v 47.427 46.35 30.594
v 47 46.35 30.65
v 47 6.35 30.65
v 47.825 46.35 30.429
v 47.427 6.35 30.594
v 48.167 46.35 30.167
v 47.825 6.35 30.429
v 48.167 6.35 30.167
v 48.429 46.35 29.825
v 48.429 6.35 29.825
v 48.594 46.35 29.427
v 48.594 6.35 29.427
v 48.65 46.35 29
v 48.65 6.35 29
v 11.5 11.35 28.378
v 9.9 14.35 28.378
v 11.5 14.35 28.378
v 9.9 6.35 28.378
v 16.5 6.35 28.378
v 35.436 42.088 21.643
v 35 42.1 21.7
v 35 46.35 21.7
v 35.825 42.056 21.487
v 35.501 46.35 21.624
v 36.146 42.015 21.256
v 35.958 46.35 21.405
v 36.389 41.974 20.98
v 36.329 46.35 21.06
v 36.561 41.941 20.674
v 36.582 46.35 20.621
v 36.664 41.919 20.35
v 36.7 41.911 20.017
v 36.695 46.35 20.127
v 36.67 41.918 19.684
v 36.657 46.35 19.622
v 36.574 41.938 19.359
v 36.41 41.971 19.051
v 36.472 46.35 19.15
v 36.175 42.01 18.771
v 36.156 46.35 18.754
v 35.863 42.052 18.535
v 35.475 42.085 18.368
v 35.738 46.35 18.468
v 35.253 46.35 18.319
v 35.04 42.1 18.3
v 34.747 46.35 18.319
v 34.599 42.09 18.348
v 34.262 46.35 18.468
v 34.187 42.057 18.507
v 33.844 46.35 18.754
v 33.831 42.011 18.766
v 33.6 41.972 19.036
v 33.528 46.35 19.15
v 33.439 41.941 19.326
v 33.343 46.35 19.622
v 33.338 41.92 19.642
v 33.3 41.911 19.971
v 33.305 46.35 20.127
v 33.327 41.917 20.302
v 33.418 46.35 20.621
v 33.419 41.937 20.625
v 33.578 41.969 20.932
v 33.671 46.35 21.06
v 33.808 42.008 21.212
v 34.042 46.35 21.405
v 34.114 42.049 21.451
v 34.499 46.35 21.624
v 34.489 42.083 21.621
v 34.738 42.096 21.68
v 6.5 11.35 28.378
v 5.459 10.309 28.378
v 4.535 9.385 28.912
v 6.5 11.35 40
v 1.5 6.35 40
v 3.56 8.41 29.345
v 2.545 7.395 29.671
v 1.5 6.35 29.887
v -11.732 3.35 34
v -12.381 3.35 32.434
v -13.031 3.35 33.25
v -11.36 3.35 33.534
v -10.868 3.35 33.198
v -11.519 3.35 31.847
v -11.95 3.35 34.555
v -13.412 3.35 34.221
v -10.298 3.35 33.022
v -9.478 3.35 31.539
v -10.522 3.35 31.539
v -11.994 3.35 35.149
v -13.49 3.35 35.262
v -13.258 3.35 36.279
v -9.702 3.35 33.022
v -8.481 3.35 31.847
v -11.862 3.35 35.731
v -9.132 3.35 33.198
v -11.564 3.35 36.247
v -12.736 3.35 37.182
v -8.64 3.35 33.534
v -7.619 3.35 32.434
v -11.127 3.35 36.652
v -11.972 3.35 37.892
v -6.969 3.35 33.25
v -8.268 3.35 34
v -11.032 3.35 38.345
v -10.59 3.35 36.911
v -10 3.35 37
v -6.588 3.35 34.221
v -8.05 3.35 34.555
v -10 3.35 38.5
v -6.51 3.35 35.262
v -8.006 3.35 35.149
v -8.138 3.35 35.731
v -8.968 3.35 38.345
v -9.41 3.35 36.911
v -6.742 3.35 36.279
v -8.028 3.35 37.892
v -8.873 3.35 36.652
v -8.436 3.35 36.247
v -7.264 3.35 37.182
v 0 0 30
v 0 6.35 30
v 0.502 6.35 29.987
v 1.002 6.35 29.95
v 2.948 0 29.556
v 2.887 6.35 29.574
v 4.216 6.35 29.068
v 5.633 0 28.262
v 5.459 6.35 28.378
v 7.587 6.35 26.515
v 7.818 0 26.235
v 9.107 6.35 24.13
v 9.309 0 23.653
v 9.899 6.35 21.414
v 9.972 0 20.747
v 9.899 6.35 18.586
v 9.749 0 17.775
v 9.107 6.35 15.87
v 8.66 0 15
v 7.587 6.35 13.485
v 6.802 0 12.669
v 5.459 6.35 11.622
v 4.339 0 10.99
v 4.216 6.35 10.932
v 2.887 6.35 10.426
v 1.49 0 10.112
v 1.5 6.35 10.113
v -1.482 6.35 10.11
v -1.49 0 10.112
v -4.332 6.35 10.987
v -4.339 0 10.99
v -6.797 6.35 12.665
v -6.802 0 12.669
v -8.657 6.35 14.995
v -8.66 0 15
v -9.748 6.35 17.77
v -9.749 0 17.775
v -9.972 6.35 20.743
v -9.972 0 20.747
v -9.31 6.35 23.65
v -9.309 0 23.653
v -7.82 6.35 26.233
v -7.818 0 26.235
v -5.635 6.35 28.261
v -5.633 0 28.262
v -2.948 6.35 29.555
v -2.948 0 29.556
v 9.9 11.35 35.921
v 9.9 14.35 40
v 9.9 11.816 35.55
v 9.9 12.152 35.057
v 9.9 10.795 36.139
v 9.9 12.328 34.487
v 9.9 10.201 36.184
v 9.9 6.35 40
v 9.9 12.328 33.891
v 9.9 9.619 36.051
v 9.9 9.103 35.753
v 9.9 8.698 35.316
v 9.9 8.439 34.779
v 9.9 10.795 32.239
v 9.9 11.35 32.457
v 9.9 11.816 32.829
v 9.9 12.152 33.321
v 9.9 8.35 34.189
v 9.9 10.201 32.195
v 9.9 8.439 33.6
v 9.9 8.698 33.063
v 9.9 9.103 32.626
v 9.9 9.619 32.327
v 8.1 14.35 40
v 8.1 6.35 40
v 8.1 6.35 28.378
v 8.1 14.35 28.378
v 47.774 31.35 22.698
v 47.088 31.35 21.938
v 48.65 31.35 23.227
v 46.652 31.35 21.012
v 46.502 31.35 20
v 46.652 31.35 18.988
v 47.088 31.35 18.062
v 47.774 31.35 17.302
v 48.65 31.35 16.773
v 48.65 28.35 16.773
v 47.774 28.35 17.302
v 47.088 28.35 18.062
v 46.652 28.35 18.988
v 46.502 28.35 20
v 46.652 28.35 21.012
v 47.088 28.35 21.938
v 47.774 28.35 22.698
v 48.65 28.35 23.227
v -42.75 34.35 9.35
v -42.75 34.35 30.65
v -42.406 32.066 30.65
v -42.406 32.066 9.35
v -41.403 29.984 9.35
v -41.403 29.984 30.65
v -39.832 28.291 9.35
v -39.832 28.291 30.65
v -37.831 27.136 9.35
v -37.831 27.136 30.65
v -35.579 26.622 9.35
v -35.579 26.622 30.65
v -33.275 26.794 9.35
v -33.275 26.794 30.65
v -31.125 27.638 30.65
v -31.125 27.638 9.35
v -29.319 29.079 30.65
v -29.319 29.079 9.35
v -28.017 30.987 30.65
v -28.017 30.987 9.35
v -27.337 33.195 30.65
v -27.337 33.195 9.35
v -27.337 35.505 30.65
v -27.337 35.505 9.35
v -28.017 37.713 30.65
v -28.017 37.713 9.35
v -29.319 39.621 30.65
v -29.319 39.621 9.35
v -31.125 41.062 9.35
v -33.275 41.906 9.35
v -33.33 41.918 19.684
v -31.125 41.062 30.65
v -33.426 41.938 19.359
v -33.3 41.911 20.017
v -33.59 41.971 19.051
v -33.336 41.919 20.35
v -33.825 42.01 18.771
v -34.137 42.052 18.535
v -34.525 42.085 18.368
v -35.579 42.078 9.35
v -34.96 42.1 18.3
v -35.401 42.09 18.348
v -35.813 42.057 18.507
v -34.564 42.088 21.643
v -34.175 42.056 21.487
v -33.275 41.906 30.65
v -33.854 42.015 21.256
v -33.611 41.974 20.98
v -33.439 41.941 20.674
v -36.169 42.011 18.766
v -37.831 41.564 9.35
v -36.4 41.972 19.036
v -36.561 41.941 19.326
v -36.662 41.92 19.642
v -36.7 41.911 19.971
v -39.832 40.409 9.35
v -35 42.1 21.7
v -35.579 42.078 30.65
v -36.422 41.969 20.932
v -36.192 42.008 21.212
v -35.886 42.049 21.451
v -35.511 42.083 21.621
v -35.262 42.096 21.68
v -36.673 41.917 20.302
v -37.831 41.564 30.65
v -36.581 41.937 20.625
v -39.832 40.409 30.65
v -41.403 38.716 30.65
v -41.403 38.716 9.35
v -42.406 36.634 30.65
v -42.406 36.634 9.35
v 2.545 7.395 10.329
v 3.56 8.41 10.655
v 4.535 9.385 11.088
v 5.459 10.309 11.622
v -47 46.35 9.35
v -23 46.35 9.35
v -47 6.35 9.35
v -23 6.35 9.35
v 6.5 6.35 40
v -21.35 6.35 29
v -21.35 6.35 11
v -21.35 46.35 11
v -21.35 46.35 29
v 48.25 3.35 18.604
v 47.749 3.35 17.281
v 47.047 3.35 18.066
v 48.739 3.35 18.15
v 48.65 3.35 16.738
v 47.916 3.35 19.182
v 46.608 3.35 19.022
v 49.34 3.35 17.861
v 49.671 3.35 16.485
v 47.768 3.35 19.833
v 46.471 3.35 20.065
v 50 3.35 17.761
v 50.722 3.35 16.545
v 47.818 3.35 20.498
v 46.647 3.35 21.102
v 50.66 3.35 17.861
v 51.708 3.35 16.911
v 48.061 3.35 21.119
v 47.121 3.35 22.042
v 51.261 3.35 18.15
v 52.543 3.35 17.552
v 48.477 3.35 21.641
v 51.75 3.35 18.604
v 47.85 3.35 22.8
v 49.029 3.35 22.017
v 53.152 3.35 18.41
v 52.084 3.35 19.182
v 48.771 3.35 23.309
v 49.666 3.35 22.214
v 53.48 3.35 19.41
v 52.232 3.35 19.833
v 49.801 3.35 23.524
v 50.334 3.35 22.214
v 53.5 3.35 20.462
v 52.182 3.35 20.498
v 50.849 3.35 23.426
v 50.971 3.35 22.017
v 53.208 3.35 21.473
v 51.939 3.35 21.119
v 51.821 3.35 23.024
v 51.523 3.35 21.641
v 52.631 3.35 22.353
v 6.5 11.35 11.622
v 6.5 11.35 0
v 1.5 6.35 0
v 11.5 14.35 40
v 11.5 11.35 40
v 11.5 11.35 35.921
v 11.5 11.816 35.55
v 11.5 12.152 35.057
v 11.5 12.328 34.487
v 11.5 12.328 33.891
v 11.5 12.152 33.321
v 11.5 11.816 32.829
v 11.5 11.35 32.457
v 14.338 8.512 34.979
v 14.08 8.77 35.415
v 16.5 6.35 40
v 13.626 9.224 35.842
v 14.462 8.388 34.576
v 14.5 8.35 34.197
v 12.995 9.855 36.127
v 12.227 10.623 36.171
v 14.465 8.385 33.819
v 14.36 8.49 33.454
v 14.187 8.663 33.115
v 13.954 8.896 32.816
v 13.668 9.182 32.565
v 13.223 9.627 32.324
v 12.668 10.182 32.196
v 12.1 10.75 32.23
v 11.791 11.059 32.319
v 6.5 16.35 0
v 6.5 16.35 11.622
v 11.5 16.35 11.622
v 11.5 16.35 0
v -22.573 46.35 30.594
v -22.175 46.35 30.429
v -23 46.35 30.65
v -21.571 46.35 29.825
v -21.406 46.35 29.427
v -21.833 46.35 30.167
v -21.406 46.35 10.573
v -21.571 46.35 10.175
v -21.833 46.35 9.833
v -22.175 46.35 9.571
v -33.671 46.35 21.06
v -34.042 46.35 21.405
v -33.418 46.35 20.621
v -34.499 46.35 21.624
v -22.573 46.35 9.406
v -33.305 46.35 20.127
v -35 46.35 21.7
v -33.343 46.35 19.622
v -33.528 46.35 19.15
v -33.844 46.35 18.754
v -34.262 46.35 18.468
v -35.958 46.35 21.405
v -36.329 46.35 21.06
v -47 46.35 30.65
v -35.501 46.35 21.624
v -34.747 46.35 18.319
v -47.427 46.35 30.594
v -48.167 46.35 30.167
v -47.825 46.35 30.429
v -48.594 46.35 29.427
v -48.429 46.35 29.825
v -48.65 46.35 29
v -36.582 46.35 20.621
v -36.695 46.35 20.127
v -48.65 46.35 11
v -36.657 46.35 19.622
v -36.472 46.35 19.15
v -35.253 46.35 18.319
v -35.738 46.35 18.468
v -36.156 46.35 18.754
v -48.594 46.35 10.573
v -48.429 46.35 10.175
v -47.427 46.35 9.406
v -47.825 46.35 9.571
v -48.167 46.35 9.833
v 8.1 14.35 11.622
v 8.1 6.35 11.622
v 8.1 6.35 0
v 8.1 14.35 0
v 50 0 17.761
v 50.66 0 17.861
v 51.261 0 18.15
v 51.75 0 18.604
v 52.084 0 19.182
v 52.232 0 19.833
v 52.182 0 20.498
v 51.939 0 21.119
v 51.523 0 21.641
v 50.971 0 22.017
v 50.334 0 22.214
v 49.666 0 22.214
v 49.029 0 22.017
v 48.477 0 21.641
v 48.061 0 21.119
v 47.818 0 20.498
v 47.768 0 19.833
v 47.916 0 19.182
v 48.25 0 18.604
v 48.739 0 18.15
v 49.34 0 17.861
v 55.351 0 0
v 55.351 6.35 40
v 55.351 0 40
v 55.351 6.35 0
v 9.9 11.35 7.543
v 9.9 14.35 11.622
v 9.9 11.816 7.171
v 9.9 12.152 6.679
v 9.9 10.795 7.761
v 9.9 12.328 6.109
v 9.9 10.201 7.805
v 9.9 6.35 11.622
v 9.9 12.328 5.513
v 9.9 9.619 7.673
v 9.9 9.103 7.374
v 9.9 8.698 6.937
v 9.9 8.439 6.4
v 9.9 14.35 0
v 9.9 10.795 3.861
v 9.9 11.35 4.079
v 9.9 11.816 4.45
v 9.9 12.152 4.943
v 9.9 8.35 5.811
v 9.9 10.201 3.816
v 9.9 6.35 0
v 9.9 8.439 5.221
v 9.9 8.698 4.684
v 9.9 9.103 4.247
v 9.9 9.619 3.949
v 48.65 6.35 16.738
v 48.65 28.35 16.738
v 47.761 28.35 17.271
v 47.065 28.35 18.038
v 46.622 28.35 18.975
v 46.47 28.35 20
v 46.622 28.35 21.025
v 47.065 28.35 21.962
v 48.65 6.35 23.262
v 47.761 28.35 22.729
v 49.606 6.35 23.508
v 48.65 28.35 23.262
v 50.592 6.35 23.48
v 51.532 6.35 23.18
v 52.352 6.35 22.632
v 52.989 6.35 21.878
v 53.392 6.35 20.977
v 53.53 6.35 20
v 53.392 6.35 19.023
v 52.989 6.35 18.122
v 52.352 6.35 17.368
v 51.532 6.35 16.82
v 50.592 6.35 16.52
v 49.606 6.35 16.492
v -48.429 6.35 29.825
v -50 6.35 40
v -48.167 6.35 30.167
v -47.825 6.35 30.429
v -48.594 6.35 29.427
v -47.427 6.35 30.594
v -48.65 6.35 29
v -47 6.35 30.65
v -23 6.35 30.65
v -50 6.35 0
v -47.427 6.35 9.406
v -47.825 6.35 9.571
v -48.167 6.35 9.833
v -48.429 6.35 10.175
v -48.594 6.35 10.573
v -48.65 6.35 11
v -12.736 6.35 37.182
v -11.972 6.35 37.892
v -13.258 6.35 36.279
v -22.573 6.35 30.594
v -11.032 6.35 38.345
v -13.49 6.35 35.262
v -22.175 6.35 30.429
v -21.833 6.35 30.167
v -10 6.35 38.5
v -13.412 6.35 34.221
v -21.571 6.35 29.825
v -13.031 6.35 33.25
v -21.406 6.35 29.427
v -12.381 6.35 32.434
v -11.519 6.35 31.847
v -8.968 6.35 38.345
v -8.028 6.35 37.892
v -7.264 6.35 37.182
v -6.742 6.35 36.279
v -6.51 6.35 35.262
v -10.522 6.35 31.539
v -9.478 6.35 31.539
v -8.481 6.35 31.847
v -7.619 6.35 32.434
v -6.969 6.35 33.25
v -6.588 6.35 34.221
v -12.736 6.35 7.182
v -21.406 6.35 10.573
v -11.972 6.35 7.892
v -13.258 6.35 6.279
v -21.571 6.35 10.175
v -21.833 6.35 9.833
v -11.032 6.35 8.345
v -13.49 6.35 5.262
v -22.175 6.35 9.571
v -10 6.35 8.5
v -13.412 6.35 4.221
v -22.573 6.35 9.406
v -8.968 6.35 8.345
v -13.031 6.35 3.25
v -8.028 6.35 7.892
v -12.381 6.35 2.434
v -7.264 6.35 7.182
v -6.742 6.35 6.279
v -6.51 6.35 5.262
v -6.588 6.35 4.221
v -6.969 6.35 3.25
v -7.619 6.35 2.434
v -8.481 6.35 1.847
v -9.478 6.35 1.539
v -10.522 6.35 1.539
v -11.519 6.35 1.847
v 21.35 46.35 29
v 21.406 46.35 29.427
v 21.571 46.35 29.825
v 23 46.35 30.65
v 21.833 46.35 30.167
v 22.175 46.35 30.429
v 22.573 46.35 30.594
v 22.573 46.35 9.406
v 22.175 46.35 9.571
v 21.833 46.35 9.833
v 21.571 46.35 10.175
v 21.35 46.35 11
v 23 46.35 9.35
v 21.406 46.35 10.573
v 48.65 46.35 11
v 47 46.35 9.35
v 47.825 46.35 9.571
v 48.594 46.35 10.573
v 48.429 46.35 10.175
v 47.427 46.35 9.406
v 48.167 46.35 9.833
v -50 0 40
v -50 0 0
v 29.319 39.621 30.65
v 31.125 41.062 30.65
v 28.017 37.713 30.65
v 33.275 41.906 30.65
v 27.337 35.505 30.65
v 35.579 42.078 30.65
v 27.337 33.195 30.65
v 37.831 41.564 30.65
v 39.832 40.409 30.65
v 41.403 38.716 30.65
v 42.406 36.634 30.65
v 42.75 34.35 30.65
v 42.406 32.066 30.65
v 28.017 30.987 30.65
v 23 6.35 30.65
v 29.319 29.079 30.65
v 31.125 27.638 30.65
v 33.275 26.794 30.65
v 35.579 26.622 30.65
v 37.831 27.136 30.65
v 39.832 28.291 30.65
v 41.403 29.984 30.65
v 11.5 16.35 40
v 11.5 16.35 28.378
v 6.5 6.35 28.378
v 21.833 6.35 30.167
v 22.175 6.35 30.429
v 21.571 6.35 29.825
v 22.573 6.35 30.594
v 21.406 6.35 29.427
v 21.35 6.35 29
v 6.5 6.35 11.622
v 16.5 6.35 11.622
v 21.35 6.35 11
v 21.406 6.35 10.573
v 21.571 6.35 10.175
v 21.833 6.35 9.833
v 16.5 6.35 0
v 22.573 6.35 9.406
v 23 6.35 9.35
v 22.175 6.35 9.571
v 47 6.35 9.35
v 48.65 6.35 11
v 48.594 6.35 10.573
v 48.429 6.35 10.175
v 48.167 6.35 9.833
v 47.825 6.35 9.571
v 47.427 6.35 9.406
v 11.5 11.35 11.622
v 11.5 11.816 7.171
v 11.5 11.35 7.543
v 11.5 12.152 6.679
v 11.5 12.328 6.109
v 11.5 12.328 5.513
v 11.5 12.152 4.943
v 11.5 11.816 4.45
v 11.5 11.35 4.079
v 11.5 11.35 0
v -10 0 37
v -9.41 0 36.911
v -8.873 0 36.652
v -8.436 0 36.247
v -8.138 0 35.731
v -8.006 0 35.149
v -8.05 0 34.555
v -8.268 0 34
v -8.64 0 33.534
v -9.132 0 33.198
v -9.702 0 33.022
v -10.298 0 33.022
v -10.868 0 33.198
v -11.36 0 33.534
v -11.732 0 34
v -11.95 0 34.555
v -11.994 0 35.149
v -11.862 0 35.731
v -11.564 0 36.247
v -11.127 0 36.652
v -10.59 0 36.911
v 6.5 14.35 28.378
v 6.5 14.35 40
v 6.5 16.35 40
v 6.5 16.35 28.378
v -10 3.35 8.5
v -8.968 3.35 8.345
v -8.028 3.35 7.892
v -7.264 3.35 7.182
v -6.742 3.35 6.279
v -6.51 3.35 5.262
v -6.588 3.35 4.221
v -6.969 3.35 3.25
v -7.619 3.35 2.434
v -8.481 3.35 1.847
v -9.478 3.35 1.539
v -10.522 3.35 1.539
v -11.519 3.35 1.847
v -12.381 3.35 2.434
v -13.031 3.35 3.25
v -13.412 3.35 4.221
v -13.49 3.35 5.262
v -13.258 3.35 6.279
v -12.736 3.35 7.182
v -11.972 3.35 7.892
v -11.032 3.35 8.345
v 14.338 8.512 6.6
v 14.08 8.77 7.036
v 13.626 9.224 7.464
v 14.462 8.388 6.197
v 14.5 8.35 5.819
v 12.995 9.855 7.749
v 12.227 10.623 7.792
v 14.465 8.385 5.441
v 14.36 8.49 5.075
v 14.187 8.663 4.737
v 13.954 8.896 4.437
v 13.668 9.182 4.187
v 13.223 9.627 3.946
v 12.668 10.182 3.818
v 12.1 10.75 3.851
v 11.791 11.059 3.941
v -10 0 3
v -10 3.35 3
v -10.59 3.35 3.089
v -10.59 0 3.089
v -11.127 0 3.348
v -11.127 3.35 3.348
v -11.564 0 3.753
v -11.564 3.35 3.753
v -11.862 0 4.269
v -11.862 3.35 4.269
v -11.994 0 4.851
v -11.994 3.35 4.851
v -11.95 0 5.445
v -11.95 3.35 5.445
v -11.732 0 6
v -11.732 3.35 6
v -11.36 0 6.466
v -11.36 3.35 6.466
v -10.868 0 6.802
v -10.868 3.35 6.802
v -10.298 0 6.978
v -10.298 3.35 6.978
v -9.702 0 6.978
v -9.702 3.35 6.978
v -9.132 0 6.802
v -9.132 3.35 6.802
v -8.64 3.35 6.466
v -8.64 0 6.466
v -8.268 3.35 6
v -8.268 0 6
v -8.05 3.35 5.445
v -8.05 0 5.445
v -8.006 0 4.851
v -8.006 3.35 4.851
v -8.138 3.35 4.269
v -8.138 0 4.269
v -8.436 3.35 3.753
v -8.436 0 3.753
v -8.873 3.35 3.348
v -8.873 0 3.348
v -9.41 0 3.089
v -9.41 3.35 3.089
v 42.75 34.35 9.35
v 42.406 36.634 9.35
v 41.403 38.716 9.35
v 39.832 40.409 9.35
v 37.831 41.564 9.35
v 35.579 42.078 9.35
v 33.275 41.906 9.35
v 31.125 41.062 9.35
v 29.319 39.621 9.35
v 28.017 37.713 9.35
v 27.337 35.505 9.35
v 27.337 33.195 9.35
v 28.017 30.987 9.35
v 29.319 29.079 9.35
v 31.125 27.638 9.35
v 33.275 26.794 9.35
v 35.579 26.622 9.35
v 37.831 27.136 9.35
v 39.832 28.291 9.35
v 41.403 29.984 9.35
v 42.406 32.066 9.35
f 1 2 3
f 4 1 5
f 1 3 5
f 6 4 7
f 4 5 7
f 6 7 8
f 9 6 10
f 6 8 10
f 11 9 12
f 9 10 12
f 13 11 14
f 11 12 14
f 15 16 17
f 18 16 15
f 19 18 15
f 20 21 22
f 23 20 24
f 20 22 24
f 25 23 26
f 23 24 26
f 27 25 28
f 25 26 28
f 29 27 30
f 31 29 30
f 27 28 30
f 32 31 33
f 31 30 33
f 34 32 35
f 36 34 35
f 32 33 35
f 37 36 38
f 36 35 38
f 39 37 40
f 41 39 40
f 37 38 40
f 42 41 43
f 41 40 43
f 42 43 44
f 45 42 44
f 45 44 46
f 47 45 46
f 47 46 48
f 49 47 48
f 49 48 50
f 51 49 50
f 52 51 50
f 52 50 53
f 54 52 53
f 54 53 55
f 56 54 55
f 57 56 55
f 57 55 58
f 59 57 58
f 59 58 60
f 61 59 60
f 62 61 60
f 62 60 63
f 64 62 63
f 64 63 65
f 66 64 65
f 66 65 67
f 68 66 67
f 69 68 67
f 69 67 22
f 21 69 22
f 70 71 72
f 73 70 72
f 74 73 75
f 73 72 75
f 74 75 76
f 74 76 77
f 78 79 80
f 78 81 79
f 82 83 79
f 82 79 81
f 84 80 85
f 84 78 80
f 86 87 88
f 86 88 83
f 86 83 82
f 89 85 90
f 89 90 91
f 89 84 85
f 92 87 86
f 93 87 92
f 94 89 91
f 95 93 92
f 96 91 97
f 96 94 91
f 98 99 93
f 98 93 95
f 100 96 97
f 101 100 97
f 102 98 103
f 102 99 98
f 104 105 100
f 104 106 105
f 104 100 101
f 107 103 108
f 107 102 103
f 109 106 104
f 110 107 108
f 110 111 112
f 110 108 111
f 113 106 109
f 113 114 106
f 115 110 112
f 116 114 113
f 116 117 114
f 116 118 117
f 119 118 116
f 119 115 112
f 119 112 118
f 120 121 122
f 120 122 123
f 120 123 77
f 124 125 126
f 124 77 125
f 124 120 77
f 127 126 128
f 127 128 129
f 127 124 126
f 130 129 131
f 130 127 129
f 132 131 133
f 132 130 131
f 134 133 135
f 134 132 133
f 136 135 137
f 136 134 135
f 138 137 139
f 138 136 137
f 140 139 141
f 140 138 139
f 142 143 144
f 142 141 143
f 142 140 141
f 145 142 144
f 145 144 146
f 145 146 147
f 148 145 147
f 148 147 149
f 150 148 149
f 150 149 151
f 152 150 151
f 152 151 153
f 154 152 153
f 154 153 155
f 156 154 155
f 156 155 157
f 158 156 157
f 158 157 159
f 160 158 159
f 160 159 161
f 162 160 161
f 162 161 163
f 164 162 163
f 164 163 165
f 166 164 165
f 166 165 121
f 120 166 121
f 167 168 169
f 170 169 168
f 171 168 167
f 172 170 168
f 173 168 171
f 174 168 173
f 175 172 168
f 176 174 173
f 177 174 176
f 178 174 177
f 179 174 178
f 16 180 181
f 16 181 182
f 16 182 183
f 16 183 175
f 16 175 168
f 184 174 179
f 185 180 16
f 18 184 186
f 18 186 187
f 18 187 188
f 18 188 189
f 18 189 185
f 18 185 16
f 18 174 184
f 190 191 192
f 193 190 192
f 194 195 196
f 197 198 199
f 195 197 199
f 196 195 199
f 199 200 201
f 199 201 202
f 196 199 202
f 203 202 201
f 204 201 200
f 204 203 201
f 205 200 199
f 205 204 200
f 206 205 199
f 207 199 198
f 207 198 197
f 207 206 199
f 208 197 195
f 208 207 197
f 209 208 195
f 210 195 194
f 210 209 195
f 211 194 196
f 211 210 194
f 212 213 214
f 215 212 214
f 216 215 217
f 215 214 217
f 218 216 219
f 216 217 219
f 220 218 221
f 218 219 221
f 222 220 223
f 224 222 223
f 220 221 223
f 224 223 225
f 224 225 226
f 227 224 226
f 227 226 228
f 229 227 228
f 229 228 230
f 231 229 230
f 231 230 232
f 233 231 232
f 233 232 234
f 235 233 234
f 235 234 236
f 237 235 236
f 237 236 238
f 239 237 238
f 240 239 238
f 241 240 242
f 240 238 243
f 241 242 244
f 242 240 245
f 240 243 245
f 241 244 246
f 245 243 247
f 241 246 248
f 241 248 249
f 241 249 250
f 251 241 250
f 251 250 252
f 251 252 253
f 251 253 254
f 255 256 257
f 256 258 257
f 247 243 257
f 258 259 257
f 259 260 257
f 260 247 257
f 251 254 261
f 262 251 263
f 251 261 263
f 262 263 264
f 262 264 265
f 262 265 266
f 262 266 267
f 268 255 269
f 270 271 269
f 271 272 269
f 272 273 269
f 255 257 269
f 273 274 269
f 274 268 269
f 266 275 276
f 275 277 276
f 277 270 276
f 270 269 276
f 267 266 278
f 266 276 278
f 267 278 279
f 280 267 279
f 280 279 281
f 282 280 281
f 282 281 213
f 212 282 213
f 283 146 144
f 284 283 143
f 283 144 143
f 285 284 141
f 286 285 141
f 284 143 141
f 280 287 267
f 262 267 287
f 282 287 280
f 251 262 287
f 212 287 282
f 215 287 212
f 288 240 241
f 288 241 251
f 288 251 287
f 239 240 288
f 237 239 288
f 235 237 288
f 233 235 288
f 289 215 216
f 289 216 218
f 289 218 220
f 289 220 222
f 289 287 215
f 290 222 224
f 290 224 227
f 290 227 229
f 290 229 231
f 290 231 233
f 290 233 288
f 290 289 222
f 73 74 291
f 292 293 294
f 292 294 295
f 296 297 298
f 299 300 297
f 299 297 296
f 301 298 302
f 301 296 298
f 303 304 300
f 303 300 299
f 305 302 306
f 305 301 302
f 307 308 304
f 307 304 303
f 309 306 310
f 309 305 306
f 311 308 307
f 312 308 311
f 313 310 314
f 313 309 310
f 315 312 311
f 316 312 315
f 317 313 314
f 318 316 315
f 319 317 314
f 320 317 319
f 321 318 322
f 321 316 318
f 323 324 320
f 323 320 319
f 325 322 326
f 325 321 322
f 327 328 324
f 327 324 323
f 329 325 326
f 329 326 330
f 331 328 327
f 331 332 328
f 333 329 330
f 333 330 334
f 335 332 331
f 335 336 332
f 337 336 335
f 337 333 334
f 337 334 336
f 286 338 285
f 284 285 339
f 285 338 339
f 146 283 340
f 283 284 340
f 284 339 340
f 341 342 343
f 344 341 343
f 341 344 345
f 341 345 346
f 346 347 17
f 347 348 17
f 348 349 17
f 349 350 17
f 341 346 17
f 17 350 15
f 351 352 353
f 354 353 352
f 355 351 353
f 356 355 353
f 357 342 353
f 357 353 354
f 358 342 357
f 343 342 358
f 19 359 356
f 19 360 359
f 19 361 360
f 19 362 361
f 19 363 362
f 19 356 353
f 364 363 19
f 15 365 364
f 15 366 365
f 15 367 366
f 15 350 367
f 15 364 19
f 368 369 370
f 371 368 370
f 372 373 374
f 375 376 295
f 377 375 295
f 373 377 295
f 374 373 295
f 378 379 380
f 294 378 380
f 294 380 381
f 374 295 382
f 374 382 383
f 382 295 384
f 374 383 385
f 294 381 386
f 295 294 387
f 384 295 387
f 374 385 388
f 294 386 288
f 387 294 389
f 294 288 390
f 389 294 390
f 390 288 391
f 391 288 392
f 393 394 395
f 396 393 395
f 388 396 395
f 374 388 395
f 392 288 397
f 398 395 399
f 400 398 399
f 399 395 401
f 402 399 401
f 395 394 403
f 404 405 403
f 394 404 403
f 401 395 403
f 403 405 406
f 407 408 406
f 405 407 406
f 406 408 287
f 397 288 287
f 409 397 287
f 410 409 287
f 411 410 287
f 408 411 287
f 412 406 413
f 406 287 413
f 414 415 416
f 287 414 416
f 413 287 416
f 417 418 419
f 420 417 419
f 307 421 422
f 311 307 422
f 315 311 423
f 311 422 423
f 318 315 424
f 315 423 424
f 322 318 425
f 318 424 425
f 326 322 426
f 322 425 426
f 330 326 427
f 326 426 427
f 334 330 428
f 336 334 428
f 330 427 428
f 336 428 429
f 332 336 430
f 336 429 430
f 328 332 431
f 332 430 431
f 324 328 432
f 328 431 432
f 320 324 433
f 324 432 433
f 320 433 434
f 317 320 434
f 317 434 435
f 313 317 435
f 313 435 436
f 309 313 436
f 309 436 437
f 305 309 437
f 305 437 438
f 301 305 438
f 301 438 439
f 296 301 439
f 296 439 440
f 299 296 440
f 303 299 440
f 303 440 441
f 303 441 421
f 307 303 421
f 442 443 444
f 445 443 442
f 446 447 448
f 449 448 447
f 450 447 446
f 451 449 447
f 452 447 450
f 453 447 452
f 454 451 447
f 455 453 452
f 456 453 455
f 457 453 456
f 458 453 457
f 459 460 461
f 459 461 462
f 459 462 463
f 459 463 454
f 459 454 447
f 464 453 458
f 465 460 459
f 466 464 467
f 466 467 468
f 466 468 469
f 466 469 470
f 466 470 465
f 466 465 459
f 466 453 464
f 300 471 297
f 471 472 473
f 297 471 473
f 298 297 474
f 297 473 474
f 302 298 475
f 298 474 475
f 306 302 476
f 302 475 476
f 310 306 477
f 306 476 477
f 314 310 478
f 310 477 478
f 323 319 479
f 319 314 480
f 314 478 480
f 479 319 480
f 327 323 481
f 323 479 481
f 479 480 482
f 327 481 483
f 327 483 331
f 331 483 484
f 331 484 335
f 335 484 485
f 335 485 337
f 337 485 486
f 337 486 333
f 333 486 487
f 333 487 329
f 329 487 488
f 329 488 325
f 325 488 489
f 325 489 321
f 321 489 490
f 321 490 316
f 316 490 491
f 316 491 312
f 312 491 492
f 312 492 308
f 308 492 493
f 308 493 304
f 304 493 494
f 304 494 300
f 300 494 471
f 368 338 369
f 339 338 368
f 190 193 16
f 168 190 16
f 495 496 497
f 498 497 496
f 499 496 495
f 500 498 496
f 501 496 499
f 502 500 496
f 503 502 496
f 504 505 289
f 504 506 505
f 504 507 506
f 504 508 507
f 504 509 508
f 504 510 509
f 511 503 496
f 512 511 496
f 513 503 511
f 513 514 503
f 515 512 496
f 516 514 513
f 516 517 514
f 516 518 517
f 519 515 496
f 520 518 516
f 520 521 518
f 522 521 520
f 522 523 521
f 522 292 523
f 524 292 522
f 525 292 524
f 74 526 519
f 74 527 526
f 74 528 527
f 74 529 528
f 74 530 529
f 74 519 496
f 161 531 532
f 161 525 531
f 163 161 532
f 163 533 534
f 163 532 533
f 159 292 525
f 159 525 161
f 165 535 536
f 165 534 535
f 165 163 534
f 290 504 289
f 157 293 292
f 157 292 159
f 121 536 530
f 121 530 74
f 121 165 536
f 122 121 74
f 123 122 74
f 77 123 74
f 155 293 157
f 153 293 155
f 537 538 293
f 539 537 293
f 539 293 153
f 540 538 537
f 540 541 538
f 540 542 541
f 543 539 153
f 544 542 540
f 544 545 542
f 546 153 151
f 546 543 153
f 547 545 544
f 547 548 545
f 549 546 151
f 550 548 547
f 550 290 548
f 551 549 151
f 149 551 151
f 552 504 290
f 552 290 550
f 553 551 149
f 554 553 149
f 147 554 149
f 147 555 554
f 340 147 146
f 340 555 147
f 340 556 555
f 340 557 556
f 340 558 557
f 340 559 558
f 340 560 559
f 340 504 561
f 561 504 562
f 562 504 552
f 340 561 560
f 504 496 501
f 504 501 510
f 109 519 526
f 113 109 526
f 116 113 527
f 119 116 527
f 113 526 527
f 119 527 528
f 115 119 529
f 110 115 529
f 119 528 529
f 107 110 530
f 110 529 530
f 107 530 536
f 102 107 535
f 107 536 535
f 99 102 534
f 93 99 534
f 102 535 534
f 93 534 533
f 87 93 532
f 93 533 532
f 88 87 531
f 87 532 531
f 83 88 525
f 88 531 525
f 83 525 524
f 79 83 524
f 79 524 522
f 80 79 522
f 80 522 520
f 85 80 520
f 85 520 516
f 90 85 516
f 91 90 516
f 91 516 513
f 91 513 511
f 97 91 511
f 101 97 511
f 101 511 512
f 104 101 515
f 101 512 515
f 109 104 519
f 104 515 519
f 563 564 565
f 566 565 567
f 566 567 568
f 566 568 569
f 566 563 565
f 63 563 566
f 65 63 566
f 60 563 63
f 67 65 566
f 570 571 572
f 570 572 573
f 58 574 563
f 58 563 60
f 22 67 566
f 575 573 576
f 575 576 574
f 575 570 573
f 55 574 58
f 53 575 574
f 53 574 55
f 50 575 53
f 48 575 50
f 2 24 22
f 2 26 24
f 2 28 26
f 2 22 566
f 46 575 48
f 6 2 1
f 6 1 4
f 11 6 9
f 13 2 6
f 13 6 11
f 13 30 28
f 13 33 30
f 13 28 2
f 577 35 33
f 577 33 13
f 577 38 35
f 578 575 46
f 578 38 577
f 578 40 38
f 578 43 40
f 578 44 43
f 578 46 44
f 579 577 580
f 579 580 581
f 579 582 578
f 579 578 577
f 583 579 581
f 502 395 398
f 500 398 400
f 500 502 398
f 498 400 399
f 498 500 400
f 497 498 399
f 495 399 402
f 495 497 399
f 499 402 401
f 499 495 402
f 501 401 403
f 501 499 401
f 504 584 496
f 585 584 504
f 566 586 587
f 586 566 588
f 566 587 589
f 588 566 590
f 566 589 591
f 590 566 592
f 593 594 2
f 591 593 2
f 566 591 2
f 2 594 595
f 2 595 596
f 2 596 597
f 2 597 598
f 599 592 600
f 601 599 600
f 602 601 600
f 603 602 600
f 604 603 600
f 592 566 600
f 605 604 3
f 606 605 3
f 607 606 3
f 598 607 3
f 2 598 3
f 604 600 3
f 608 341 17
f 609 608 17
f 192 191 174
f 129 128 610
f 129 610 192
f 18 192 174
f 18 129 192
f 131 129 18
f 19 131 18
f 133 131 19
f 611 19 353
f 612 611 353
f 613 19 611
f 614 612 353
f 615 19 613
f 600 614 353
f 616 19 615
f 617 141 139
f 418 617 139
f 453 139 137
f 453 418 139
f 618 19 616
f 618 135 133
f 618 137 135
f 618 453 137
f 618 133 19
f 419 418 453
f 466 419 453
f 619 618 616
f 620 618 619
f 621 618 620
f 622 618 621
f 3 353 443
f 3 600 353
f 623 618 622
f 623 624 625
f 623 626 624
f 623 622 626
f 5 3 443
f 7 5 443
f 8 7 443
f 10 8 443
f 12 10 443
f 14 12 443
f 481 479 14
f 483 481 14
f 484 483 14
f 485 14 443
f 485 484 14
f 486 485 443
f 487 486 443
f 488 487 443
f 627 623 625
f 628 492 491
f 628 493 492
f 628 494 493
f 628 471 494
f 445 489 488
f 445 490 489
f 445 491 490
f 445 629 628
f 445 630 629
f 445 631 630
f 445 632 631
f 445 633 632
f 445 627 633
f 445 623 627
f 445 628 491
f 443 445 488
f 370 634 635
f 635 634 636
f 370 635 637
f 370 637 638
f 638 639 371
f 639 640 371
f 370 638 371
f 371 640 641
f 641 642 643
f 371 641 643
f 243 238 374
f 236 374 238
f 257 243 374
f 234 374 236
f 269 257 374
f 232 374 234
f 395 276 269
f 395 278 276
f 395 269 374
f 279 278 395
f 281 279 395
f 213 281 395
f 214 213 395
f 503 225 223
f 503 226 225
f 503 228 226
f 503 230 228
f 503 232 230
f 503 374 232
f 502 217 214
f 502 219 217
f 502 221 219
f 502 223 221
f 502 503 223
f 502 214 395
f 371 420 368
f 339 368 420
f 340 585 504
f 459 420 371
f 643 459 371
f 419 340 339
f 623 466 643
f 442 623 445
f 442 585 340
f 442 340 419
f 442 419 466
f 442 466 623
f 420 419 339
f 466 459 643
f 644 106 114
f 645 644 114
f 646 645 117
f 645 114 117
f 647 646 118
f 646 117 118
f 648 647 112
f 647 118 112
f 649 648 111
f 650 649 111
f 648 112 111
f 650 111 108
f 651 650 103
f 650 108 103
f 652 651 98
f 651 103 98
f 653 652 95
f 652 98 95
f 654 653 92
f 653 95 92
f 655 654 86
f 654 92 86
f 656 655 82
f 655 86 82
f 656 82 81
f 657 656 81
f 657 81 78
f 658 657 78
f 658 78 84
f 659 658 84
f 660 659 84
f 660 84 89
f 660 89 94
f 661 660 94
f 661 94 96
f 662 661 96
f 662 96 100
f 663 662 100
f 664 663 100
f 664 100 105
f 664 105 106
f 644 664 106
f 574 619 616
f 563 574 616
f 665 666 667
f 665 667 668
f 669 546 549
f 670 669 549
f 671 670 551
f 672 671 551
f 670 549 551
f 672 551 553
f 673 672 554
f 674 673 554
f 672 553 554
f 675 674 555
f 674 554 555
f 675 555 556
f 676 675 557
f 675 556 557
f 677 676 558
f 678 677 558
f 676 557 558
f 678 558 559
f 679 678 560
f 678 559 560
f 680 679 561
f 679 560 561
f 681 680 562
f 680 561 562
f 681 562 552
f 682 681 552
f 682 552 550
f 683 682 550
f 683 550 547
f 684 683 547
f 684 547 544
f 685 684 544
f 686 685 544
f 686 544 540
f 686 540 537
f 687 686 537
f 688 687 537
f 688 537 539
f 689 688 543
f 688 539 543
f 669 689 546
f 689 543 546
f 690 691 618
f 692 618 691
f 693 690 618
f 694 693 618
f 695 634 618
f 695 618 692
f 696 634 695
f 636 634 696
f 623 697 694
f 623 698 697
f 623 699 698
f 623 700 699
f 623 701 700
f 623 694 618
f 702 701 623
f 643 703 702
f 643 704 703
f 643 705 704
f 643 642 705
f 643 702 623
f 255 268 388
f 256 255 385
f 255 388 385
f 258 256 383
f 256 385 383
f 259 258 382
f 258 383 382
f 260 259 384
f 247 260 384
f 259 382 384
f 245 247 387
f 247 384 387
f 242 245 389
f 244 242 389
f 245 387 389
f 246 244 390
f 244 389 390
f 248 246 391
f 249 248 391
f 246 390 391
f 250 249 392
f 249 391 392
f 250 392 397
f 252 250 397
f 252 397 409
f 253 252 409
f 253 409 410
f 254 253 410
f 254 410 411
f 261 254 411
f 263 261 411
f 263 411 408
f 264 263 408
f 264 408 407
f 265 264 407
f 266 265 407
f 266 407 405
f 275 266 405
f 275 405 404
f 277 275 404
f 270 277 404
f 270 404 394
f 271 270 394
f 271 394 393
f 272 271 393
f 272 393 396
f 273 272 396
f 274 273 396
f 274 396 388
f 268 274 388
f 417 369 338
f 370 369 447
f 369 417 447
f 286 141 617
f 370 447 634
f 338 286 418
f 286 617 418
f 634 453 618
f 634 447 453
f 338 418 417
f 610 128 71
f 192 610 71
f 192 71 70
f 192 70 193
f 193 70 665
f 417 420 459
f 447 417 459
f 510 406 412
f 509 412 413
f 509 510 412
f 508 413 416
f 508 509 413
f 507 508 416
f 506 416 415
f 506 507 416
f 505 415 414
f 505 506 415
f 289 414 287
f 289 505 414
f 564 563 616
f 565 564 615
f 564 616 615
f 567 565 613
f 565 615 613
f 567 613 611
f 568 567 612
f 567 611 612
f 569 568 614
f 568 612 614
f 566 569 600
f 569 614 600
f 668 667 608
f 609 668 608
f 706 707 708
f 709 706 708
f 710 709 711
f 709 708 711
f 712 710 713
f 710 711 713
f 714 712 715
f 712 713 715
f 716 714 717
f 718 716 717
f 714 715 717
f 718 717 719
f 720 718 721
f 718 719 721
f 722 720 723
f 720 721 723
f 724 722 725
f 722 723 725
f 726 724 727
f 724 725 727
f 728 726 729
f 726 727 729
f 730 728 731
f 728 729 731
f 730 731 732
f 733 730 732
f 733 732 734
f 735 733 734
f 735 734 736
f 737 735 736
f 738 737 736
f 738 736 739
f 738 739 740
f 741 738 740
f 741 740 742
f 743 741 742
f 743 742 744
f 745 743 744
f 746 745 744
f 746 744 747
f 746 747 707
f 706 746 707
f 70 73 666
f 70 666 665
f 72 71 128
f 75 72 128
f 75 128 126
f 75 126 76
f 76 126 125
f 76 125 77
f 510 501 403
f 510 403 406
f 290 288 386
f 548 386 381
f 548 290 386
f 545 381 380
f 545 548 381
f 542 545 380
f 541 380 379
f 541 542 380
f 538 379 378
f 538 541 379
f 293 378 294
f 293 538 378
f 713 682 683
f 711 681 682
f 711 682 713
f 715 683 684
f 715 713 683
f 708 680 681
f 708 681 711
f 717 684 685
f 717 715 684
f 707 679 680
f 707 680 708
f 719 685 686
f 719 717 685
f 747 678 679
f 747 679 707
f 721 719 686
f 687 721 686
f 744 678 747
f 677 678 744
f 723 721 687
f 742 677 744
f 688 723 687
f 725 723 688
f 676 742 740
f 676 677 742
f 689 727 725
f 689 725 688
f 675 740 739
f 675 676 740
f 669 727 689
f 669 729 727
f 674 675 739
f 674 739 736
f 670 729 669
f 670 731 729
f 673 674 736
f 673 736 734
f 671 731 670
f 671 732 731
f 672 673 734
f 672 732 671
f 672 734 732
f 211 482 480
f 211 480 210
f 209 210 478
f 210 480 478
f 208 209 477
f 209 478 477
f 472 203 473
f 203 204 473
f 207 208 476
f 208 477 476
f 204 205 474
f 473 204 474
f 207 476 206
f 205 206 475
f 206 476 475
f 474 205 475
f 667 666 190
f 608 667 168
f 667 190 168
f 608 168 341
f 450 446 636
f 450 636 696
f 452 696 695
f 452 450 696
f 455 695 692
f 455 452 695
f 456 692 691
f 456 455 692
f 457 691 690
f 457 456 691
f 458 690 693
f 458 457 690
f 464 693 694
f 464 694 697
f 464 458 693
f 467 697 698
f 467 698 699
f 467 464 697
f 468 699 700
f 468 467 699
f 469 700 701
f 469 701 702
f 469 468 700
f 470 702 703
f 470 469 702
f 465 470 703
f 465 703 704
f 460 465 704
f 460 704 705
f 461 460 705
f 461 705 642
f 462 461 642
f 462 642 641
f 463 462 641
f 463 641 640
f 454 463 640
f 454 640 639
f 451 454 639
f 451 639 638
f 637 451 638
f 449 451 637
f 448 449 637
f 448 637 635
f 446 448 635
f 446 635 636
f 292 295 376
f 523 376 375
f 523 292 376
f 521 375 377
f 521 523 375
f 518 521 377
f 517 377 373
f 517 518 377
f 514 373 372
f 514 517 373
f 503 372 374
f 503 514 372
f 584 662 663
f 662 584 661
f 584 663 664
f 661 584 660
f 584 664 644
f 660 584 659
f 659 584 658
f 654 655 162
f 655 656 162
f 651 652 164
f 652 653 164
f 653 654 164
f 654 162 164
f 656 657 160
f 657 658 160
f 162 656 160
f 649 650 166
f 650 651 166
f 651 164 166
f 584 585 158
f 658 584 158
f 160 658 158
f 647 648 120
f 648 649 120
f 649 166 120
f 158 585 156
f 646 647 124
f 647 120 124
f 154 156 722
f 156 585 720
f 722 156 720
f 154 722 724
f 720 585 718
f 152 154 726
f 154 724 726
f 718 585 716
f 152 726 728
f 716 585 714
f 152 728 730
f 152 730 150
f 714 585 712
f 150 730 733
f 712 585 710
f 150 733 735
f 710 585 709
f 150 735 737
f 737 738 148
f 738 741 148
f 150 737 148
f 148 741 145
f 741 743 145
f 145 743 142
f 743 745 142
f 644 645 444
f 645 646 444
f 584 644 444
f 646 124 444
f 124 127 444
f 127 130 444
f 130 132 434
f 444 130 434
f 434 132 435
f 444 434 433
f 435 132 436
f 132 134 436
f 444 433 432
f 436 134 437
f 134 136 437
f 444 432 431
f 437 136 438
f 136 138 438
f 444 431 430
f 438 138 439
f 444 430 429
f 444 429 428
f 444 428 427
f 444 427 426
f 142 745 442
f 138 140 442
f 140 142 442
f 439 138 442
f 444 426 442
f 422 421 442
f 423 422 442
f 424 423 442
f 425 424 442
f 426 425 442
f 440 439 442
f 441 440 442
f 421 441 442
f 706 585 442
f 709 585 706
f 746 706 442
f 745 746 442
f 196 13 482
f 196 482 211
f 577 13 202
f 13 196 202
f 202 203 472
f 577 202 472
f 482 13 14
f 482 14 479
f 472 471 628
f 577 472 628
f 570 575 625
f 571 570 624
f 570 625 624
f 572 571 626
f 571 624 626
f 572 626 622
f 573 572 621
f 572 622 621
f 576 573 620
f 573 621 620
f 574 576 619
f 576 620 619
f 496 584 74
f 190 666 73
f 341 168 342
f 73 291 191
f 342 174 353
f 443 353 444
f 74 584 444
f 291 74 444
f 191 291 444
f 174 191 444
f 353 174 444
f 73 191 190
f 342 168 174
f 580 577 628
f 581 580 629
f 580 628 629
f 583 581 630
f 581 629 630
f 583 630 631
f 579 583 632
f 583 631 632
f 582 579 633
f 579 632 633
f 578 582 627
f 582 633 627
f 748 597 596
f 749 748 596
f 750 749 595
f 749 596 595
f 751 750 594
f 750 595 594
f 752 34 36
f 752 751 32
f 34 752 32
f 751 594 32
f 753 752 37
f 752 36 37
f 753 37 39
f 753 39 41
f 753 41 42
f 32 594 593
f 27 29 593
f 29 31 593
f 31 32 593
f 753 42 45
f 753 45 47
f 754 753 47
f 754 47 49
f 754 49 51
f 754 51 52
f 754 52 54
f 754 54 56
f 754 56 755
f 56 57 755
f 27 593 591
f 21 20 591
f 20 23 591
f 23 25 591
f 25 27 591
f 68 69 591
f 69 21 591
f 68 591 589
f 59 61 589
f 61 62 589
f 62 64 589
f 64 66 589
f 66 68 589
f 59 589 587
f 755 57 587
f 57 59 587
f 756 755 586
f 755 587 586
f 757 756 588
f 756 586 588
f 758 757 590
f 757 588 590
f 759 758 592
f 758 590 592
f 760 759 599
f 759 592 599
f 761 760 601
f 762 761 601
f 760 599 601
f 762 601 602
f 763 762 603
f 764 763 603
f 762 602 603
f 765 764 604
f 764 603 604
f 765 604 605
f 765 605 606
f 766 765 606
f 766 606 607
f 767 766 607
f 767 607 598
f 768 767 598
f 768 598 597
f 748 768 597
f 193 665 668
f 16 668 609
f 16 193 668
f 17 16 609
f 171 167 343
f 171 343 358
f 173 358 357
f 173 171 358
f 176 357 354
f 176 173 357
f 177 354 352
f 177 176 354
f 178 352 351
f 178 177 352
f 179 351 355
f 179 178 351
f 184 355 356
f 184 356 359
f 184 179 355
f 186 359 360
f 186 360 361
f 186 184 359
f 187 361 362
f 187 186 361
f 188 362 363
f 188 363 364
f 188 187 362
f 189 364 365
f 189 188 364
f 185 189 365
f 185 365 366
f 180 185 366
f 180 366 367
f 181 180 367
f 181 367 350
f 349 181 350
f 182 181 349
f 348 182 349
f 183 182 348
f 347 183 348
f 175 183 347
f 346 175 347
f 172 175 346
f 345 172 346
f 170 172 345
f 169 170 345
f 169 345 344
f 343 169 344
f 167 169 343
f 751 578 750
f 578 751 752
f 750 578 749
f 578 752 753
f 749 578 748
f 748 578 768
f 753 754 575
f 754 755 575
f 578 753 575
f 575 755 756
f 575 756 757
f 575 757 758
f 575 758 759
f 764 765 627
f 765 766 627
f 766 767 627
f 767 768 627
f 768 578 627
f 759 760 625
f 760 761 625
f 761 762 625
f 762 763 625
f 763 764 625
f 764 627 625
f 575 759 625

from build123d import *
from build123d.topology import SkipClean

# Parameters (mm, degrees)
SKETCH1_W                = 100
SKETCH1_H                = 80
SKETCH1_R                = 10
SKETCH1_R_2              = 1.65
BOSS_EXTRUDE1_DEPTH      = 6.35
SKETCH3_R                = 2
CUT_EXTRUDE5_DEPTH       = 65.345337826
BOSS_EXTRUDE2_DEPTH      = 6.35
SKETCH6_W                = 105.351133128
SKETCH6_H                = 40
CUT_EXTRUDE6_DEPTH       = 69.586226304
SKETCH7_R                = 3.5
CUT_EXTRUDE7_DEPTH       = 3
BOSS_EXTRUDE4_START      = -6.35
BOSS_EXTRUDE4_DEPTH      = 46.35
SKETCH9_R                = 3.497663505
CUT_EXTRUDE8_DEPTH       = 25
CUT_EXTRUDE9_START       = 25
SKETCH10_R               = 3.529979832
SKETCH10_R_2             = 2
CUT_EXTRUDE9_DEPTH       = 25
SKETCH12_R               = 2.238504643
CUT_EXTRUDE10_DEPTH      = 25
SKETCH13_R               = 7.75
CUT_EXTRUDE11_DEPTH      = 25
SKETCH14_R               = 1.7
CUT_EXTRUDE12_DEPTH      = 10
SKETCH16_W               = 1.6
SKETCH16_H               = 11.621506057
BOSS_EXTRUDE5_DEPTH      = 8
CHAMFER1_SIZE            = 5
CHAMFER2_SIZE            = 5
CUT_EXTRUDE13_DEPTH      = 8
CUT_EXTRUDE13_DEPTH_BACK = 1.6
SKETCH17_R               = 2
SKETCH18_W               = 5
SKETCH18_H               = 11.621506057
BOSS_EXTRUDE6_DEPTH      = 2


with BuildPart() as part:
    # Sketch1 → Boss-Extrude1 (new body)
    with BuildSketch(Plane(origin=(0, 0, 0), x_dir=(1, 0, 0), z_dir=(0, 1, 0))):
        Rectangle(SKETCH1_W, SKETCH1_H)
        with Locations(Location((0, -20, 0), (0, 0, 270))):
            Circle(SKETCH1_R, mode=Mode.SUBTRACT)
        with Locations(Location((23, -29, 0), (0, 0, 270))):
            Circle(SKETCH1_R_2, mode=Mode.SUBTRACT)
        with Locations(Location((47, -11, 0), (0, 0, 270))):
            Circle(SKETCH1_R_2, mode=Mode.SUBTRACT)
        with Locations(Location((23, -11, 0), (0, 0, 270))):
            Circle(SKETCH1_R_2, mode=Mode.SUBTRACT)
        with Locations(Location((47, -29, 0), (0, 0, 270))):
            Circle(SKETCH1_R_2, mode=Mode.SUBTRACT)
        with Locations(Location((-23, -29, 0), (0, 0, 90))):
            Circle(SKETCH1_R_2, mode=Mode.SUBTRACT)
        with Locations(Location((-47, -29, 0), (0, 0, 90))):
            Circle(SKETCH1_R_2, mode=Mode.SUBTRACT)
        with Locations(Location((-47, -11, 0), (0, 0, 90))):
            Circle(SKETCH1_R_2, mode=Mode.SUBTRACT)
        with Locations(Location((-23, -11, 0), (0, 0, 90))):
            Circle(SKETCH1_R_2, mode=Mode.SUBTRACT)
    extrude(amount=BOSS_EXTRUDE1_DEPTH)

    # Sketch3 → Cut-Extrude5 (cut, through all)
    with BuildSketch(Plane(origin=(0, 6.35, 0), x_dir=(1, 0, 0), z_dir=(0, 1, 0))):
        with Locations((50, -20)):
            Circle(SKETCH3_R)
        with Locations(Location((-10, -35, 0), (0, 0, 270))):
            Circle(SKETCH3_R)
        with Locations(Location((-10, -5, 0), (0, 0, 90))):
            Circle(SKETCH3_R)
    extrude(amount=-CUT_EXTRUDE5_DEPTH, mode=Mode.SUBTRACT)

    # Sketch5 → Boss-Extrude2 (add)
    with SkipClean():  # the faces are left unmerged after this step: merging them gives an invalid solid
        with BuildSketch(Plane(origin=(0, 6.35, 0), x_dir=(1, 0, 0), z_dir=(0, 1, 0))):
            with BuildLine():
                Line((50, -22), (50, -40))
                Line((50, -40), (55.351133128, -40))
                Line((55.351133128, -40), (55.351133128, 40))
                Line((55.351133128, 40), (50, 40))
                Line((50, 40), (50, -18))
                ThreePointArc((50, -18), (52, -20), (50, -22))
            make_face()
        extrude(amount=-BOSS_EXTRUDE2_DEPTH)

    # Sketch6 → Cut-Extrude6 (cut, through all)
    with SkipClean():  # the faces are left unmerged after this step: merging them gives an invalid solid
        with BuildSketch(Plane(origin=(0, 6.35, 0), x_dir=(1, 0, 0), z_dir=(0, 1, 0))):
            with Locations((2.675566564, 20)):
                Rectangle(SKETCH6_W, SKETCH6_H)
        extrude(amount=-CUT_EXTRUDE6_DEPTH, mode=Mode.SUBTRACT)

    # Sketch7 → Cut-Extrude7 (cut)
    with SkipClean():  # the faces are left unmerged after this step: merging them gives an invalid solid
        with BuildSketch(Plane(origin=(0, 6.35, 0), x_dir=(1, 0, 0), z_dir=(0, 1, 0))):
            with Locations(Location((-10, -5, 0), (0, 0, 270))):
                Circle(SKETCH7_R)
            with Locations(Location((-10, -35, 0), (0, 0, 270))):
                Circle(SKETCH7_R)
            with Locations(Location((50, -20, 0), (0, 0, 270))):
                Circle(SKETCH7_R)
        extrude(amount=-CUT_EXTRUDE7_DEPTH, mode=Mode.SUBTRACT)

    # Sketch8 → Boss-Extrude4 (add)
    with BuildSketch(Plane(origin=(0, 6.35, 0), x_dir=(1, 0, 0), z_dir=(0, 1, 0)).offset(BOSS_EXTRUDE4_START)):
        with BuildLine():
            Line((-47, -9.35), (-23, -9.35))
            ThreePointArc((-23, -9.35), (-21.833273811, -9.833273811), (-21.35, -11))
            Line((-21.35, -11), (-21.35, -29))
            ThreePointArc((-21.35, -29), (-21.833273811, -30.166726189), (-23, -30.65))
            Line((-23, -30.65), (-47, -30.65))
            ThreePointArc((-47, -30.65), (-48.166726189, -30.166726189), (-48.65, -29))
            Line((-48.65, -29), (-48.65, -11))
            ThreePointArc((-48.65, -11), (-48.166726189, -9.833273811), (-47, -9.35))
        make_face()
        with BuildLine():
            Line((21.35, -11), (21.35, -29))
            ThreePointArc((21.35, -29), (21.833273811, -30.166726189), (23, -30.65))
            Line((23, -30.65), (47, -30.65))
            ThreePointArc((47, -30.65), (48.166726189, -30.166726189), (48.65, -29))
            Line((48.65, -29), (48.65, -11))
            ThreePointArc((48.65, -11), (48.166726189, -9.833273811), (47, -9.35))
            Line((47, -9.35), (23, -9.35))
            ThreePointArc((23, -9.35), (21.833273811, -9.833273811), (21.35, -11))
        make_face()
    extrude(amount=BOSS_EXTRUDE4_DEPTH)

    # Sketch9 → Cut-Extrude8 (cut)
    with BuildSketch(Plane(origin=(0, 6.35, 0), x_dir=(1, 0, 0), z_dir=(0, 1, 0))):
        with Locations((50, -20)):
            Circle(SKETCH9_R)
    extrude(amount=CUT_EXTRUDE8_DEPTH, mode=Mode.SUBTRACT)

    # Sketch10 → Cut-Extrude9 (cut)
    with BuildSketch(Plane(origin=(0, 3.35, 0), x_dir=(1, 0, 0), z_dir=(0, 1, 0)).offset(CUT_EXTRUDE9_START)):
        with Locations(Location((50, -20, 0), (0, 0, 112.484807611))):
            Circle(SKETCH10_R)
        with Locations((50, -20)):
            Circle(SKETCH10_R_2, mode=Mode.SUBTRACT)
    extrude(amount=-CUT_EXTRUDE9_DEPTH, mode=Mode.SUBTRACT)

    # Sketch12 → Cut-Extrude10 (cut)
    with BuildSketch(Plane.XZ):
        with Locations(Location((50, 20, 0), (0, 0, 270))):
            Circle(SKETCH12_R)
    extrude(amount=-CUT_EXTRUDE10_DEPTH, mode=Mode.SUBTRACT)

    # Sketch13 → Cut-Extrude11 (cut)
    with BuildSketch(Plane.XY.offset(30.65)):
        with Locations((35, 34.35)):
            Circle(SKETCH13_R)
        with Locations(Location((-35, 34.35, 0), (0, 0, 180))):
            Circle(SKETCH13_R)
    extrude(amount=-CUT_EXTRUDE11_DEPTH, mode=Mode.SUBTRACT)

    # Sketch14 → Cut-Extrude12 (cut)
    with BuildSketch(Plane(origin=(0, 46.35, 0), x_dir=(1, 0, 0), z_dir=(0, 1, 0))):
        with Locations(Location((35, -20, 0), (0, 0, 270))):
            Circle(SKETCH14_R)
        with Locations(Location((-35, -20, 0), (0, 0, 270))):
            Circle(SKETCH14_R)
    extrude(amount=-CUT_EXTRUDE12_DEPTH, mode=Mode.SUBTRACT)

    # Sketch16 → Boss-Extrude5 (add)
    with BuildSketch(Plane(origin=(0, 6.35, 0), x_dir=(1, 0, 0), z_dir=(0, 1, 0))):
        with Locations((10.7, -34.189246971)):
            Rectangle(SKETCH16_W, SKETCH16_H)
        with Locations((7.3, -5.810753029)):
            Rectangle(SKETCH16_W, SKETCH16_H)
        with Locations((10.7, -5.810753029)):
            Rectangle(SKETCH16_W, SKETCH16_H)
        with Locations((7.3, -34.189246971)):
            Rectangle(SKETCH16_W, SKETCH16_H)
    extrude(amount=BOSS_EXTRUDE5_DEPTH)

    # Chamfer1
    chamfer1_edges = [part.edges().sort_by_distance(p)[0] for p in [
        (11.5, 6.35, 5.810753029),
        (11.5, 6.35, 34.189246971),
    ]]
    chamfer(chamfer1_edges, length=CHAMFER1_SIZE)

    # Chamfer2
    # the kernel refuses this chamfer: 5 mm, written as the material it adds along each edge
    with BuildSketch(Plane(origin=(6.5, 6.35, 0), x_dir=(0.027495876610586317, 0.9996219169112968, 0), z_dir=(0, 0, 1))) as chamfer2_piece_1_section:
        Polygon((CHAMFER2_SIZE * 0.999621916911, CHAMFER2_SIZE * 0.0274958766106), (-CHAMFER2_SIZE * 0.0274958766106, CHAMFER2_SIZE * 0.999621916911), (0, 0), align=None)
    chamfer2_piece_1 = extrude(amount=11.621506057, mode=Mode.PRIVATE)
    chamfer2_piece_1 = chamfer2_piece_1 - Plane(origin=(0, 8.026002071, 20), x_dir=(0, 0, 1), z_dir=(0, -1, 0)) * Cylinder(10, 44, mode=Mode.PRIVATE)
    add(chamfer2_piece_1)
    with BuildSketch(Plane(origin=(6.5, 6.35, 28.378493943), x_dir=(0.027495876610586317, 0.9996219169112968, 0), z_dir=(0, 0, 1))) as chamfer2_piece_2_section:
        Polygon((CHAMFER2_SIZE * 0.999621916911, CHAMFER2_SIZE * 0.0274958766106), (-CHAMFER2_SIZE * 0.0274958766106, CHAMFER2_SIZE * 0.999621916911), (0, 0), align=None)
    chamfer2_piece_2 = extrude(amount=11.621506057, mode=Mode.PRIVATE)
    chamfer2_piece_2 = chamfer2_piece_2 - Plane(origin=(0, 8.026002093, 20), x_dir=(0, 0, 1), z_dir=(0, -1, 0)) * Cylinder(10, 44, mode=Mode.PRIVATE)
    add(chamfer2_piece_2)

    # Sketch17 → Cut-Extrude13 (cut, two sides: drawn at the far end of the back side and taken through both)
    with BuildSketch(Plane(origin=(11.5, 0, 0), x_dir=(0, 0, -1), z_dir=(1, 0, 0)).offset(-CUT_EXTRUDE13_DEPTH_BACK)):
        with Locations(Location((-5.810753029, 10.35, 0), (0, 0, 150))):
            Circle(SKETCH17_R)
        with Locations(Location((-34.189246971, 10.35, 0), (0, 0, 150))):
            Circle(SKETCH17_R)
    extrude(amount=CUT_EXTRUDE13_DEPTH + CUT_EXTRUDE13_DEPTH_BACK, mode=Mode.SUBTRACT)

    # Sketch18 → Boss-Extrude6 (add)
    with BuildSketch(Plane(origin=(0, 14.35, 0), x_dir=(1, 0, 0), z_dir=(0, 1, 0))):
        with Locations((9, -5.810753029)):
            Rectangle(SKETCH18_W, SKETCH18_H)
        with Locations((9, -34.189246971)):
            Rectangle(SKETCH18_W, SKETCH18_H)
    extrude(amount=BOSS_EXTRUDE6_DEPTH)


solid = part.part
